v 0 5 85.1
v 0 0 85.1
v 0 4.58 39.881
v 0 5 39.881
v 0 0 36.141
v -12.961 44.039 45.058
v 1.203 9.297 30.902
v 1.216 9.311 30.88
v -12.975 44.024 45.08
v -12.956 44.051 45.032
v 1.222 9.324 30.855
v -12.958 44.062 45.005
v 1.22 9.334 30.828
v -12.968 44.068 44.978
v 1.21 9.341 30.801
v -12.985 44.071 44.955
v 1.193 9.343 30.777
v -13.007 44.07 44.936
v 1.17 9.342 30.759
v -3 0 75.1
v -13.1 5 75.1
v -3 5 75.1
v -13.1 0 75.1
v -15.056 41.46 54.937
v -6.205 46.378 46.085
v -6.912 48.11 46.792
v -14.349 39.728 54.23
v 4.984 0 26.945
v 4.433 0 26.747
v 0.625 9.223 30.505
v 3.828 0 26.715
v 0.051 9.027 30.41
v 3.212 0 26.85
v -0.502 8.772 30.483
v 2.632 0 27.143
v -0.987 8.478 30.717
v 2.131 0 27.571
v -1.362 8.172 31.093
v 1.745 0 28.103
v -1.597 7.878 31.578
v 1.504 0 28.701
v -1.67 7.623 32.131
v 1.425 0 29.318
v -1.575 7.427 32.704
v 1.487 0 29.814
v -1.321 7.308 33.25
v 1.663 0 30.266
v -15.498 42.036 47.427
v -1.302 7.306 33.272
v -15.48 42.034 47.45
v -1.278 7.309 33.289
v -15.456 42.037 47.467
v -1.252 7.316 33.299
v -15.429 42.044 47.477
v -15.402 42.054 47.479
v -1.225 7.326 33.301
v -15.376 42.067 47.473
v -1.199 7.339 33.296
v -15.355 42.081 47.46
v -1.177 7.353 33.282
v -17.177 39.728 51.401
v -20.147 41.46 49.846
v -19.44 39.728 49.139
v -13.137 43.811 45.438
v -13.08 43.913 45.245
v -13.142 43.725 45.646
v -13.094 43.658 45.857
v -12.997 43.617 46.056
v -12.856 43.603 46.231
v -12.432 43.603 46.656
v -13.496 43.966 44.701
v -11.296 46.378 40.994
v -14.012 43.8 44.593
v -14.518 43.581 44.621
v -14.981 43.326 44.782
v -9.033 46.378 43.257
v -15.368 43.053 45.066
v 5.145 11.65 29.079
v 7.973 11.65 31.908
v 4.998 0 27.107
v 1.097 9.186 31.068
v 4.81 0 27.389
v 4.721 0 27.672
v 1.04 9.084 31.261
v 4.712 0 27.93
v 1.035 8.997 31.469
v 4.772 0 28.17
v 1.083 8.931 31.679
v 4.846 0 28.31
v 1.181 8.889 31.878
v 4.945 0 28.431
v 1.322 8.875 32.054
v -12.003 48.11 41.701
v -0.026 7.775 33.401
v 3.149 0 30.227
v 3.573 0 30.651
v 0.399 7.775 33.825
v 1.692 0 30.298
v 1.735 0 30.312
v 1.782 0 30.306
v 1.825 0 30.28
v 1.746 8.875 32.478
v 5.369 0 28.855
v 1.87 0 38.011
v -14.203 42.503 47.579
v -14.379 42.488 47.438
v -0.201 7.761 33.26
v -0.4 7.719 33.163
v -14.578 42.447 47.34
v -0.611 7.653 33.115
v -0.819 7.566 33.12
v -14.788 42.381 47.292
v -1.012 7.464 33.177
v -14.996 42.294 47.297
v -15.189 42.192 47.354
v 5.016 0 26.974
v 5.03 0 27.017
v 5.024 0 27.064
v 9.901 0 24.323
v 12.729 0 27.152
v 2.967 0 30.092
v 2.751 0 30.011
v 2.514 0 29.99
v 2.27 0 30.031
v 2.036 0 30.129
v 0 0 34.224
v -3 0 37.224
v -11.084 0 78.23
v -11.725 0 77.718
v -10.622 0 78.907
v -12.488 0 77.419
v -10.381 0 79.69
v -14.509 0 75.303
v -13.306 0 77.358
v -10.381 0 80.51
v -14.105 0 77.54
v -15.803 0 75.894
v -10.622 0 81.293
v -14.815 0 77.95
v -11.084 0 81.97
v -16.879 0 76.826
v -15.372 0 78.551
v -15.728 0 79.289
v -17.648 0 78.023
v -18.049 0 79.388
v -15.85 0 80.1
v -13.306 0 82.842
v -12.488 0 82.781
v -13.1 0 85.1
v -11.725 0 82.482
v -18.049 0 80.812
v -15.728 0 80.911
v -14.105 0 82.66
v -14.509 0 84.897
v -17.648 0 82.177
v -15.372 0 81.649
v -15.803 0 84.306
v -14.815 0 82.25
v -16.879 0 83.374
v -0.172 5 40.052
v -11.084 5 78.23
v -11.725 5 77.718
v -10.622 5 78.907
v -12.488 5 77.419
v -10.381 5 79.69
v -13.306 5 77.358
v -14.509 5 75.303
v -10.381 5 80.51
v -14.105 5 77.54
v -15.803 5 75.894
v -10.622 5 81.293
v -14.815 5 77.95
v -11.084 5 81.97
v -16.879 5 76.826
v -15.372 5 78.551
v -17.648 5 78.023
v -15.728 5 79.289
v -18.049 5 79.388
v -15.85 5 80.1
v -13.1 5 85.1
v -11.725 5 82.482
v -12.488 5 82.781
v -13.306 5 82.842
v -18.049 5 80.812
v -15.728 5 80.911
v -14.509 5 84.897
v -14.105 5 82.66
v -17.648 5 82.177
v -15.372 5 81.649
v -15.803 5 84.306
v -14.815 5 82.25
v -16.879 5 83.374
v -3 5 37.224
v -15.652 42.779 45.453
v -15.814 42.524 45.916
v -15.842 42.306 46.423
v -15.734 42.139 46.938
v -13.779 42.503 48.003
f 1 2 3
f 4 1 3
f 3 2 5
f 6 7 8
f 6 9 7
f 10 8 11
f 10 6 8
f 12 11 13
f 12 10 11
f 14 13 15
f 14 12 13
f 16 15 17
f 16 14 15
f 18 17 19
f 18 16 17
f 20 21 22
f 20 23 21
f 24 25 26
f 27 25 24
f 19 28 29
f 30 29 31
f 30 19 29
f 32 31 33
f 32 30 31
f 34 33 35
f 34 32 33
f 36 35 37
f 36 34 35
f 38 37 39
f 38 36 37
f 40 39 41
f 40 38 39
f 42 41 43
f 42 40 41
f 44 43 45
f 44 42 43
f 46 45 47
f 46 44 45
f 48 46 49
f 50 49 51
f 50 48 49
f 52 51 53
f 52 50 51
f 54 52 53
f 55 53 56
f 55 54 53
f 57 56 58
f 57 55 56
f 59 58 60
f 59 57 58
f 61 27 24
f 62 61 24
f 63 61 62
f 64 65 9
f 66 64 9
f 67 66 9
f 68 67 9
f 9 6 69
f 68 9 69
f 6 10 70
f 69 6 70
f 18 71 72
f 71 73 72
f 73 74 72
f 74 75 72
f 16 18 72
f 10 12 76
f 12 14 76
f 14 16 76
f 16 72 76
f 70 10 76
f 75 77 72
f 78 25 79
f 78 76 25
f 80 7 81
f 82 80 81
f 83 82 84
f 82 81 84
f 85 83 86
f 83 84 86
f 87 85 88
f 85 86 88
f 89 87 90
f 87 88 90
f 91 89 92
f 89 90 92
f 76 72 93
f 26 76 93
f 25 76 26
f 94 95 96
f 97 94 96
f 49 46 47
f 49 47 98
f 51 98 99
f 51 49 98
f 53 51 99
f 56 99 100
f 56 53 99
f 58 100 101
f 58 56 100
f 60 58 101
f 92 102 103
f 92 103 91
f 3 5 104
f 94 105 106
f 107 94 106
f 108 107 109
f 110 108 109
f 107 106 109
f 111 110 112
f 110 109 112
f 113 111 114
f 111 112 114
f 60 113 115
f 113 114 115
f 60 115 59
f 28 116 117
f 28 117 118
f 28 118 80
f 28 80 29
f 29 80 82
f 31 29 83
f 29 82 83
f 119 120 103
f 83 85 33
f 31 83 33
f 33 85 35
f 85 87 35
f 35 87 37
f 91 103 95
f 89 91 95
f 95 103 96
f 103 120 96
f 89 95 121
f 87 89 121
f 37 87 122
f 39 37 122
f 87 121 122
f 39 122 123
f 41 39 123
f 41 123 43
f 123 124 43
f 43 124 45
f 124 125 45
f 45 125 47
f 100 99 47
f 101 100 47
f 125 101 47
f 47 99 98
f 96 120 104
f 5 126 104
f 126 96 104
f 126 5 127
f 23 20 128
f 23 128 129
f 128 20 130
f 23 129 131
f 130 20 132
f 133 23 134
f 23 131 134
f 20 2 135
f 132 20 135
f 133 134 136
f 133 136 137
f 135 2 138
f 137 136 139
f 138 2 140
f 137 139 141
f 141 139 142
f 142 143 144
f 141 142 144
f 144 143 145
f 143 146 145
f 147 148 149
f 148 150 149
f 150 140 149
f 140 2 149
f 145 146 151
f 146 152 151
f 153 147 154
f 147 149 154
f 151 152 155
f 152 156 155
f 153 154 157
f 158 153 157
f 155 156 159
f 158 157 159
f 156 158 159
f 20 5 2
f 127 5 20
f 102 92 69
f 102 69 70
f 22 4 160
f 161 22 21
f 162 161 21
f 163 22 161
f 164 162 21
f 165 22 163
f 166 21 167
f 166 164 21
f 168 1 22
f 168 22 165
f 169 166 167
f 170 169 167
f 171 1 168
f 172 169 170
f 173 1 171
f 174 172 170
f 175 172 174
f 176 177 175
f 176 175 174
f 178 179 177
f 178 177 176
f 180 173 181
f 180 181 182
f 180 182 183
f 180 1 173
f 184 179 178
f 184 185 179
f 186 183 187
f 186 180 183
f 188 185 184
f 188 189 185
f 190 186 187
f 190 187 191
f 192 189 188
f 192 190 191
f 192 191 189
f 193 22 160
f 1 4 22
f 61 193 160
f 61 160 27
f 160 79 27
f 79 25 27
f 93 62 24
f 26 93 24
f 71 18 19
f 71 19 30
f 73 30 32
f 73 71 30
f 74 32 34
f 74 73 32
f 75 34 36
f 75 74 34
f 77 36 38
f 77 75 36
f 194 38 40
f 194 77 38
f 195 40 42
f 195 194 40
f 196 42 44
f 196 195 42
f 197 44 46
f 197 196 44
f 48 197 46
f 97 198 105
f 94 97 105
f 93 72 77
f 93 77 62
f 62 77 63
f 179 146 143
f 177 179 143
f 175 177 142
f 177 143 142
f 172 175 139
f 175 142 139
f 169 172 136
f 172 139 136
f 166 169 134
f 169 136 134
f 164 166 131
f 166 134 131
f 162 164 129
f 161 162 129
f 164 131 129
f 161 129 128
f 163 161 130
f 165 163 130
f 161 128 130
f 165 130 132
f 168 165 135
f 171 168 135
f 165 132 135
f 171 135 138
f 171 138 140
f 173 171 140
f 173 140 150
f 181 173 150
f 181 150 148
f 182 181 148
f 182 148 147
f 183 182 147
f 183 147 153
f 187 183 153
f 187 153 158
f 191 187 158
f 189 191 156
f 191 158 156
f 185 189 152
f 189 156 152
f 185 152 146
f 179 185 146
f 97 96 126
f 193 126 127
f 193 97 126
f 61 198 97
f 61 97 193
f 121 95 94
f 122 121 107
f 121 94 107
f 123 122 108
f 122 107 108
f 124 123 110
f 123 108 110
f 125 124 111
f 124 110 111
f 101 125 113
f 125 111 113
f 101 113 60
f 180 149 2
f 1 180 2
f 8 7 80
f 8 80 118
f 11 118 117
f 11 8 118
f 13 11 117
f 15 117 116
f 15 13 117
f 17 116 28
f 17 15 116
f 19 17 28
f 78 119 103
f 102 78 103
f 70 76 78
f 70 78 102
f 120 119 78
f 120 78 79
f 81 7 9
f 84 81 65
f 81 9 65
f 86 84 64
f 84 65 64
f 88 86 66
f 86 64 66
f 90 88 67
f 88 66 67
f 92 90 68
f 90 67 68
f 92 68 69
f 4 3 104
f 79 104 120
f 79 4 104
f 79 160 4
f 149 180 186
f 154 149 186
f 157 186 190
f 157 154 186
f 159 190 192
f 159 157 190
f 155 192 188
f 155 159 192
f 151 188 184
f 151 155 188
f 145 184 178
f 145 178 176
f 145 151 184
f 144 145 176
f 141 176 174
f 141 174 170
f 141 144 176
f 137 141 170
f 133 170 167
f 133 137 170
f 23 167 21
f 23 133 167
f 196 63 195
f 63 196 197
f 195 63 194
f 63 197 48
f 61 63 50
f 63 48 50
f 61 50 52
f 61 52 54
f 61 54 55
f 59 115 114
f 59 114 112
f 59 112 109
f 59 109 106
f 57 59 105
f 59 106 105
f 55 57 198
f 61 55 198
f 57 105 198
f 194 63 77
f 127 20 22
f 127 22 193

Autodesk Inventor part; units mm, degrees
ref_plane "YZ Plane" through (0, 0, 0) normal (1, 0, 0) x (0, 1, 0)
ref_plane "XZ Plane" through (0, 0, 0) normal (0, 1, 0) x (-1, 0, 0)
ref_plane "XY Plane" through (0, 0, 0) normal (0, 0, 1) x (1, 0, 0)
sketch "Sketch2" plane through (0, 0, 0) normal (0, 1, 0) x (-1, 0, 0)
  circle A0 centre (13.1, 80.1) radius 2.75
  circle A1 centre (80.1, 13.1) radius 2.75 construction
  line L0 (13.1, 80.1) -> (13.1, 13.1)
  line L1 (13.1, 13.1) -> (80.1, 13.1)
  line L2 (3, 37.224) -> (37.224, 3)
  line L3 (3, 37.224) -> (51.4, 37.224) construction
  circle A2 centre (80.1, 13.1) radius 2.75
  line L4 (3.1, 112.1) -> (3.1, 79.1)
  line L5 (79.1, 3.1) -> (112.1, 3.1)
  circle A3 centre (13.1, 80.1) radius 5
  line L6 (13.1, 75.1) -> (3, 75.1)
  line L7 (3, 75.1) -> (3, 3)
  line L8 (13.1, 85.1) -> (0, 85.1)
  line L9 (0, 85.1) -> (0, 0)
  circle A4 centre (80.1, 13.1) radius 5
  line L10 (85.1, 13.1) -> (85.1, 0)
  line L11 (75.1, 13.1) -> (75.1, 3)
  line L12 (75.1, 3) -> (3, 3)
  line L13 (85.1, 0) -> (0, 0)
  line L14 (3, 37.224) -> (-4.0711, 30.1529)
  line L15 (3, 37.224) -> (13, 37.224) construction
  point P0 (0, 0)
  point P1 (0, 34.224)
  dimension "d11" = 48.4
  dimension "d12" = 45
  dimension "d13" = 10
  dimension "d14" = 10.1
  dimension "d15" = 13.1
  dimension "d16" = 3
  dimension "d17" = 10
  dimension "d18" = 13.1
  dimension "d19" = 10.1
  dimension "d20" = 10
  dimension "d21" = 135
extrude "Extrusion2" add sketch "Sketch2" along normal blind 5 contours L6 L7 L14 L9 L8 A3 | A3
sketch "Sketch4" plane through (-3, 0, 37.224) normal (-0.7071068, 0, -0.7071068) x (-0.7071068, 0, 0.7071068)
  line L0 (0, 0) -> (0, 5) projected
  line L1 (0, 5) -> (20.05, 39.7276)
  line L2 (0, 5) -> (40.1, 5) construction
  line L3 (8.5319, 46.3776) -> (-11.5181, 11.65)
  line L4 (-11.5181, 11.65) -> (0, 5)
  line L5 (8.5319, 46.3776) -> (20.05, 39.7276)
  line L6 (-4.2426, 0) -> (0, 0) projected
  line L7 (0, 0) -> (0, 5) projected
  line L8 (-4.2426, 5) -> (0, 5) projected
  line L9 (-4.2426, 0) -> (-4.2426, 5) projected
  line L10 (-4.2426, 5) -> (-4.2426, 7.4495)
  point P0 (-28.4426, 0)
  dimension "d33" = 300
  dimension "d34" = 40.1
  dimension "d35" = 13.3
extrude "Extrusion3" add sketch "Sketch4" against normal blind 4 contours L4 L3 L5 L1
sketch "Sketch6" plane through (0, -2.3485, 34.224) normal (-0.7071068, 0, -0.7071068) x (-0.7071068, 0, 0.7071068)
  line L0 (0, 2.3485) -> (0, 7.3485) projected
  circle A0 centre (0.9836, 15.0036) radius 2.6
  line L1 (3.7898, 7.6099) -> (-7.6418, 14.2099)
  circle A1 centre (6.9836, 25.3959) radius 2.6
  line L2 (0, 2.3485) -> (4.2426, 2.3485) projected
  line L3 (-7.2755, 13.9985) -> (4.2426, 7.3485) projected
  line L4 (11.0336, 32.4107) -> (-8.7344, -1.8285)
  line L5 (4.2426, 2.3485) -> (4.2426, 7.3485) projected
  line L6 (0, 7.3485) -> (4.2426, 7.3485) projected
  point P0 (-24.2, 2.3485)
  dimension "d38" = 5.2
  dimension "d39" = 5
  dimension "d40" = 12
extrude "Extrusion5" [suppressed]
fillet "Fillet1" [suppressed]
sketch "Sketch9" plane through (-0.1716, 0, 40.0524) normal (0.7071068, 0, 0.7071068) x (0.7071068, 0, -0.7071068)
  line L0 (0, 5) -> (-20.05, 39.7276) projected
  line L1 (-20.05, 39.7276) -> (-12.55, 26.7372)
  line L2 (-12.55, 26.7372) -> (-15.1481, 25.2372)
  line L3 (-15.1481, 25.2372) -> (-22.6481, 38.2276)
  line L4 (-22.6481, 38.2276) -> (-20.05, 39.7276)
  line L5 (-8.5319, 46.3776) -> (-20.05, 39.7276) projected
  line L6 (-14.2909, 43.0526) -> (11.2, -1.0989)
  line L7 (-8.5319, 46.3776) -> (-1.0319, 33.3872)
  line L8 (1.5662, 34.8872) -> (-5.9338, 47.8776)
  line L9 (-1.0319, 33.3872) -> (1.5662, 34.8872)
  line L10 (-5.9338, 47.8776) -> (-8.5319, 46.3776)
  point P0 (28.4426, 0)
  point P1 (4.6202, -0.5061)
  point P2 (4.1955, 0)
  dimension "d46" = 15
  dimension "d47" = 3
extrude "Extrusion6" [suppressed]
sketch "Sketch10" plane through (-17.1775, 39.7276, 51.4015) normal (-0.3535534, 0.8660254, 0.3535534) x (0.7071068, 0, 0.7071068)
  line L0 (0, 0) -> (0, 13.3) projected
  line L1 (0, 0) -> (4, 0) projected
  line L2 (4, 13.3) -> (4, 0) projected
  line L3 (0, 13.3) -> (4, 13.3) projected
  line L4 (-0.6, 8.15) -> (0, 8.15)
  line L5 (0, -1.85) -> (0, 5.15)
  line L6 (0, 5.15) -> (-0.6, 5.15)
  arc A0 (-0.6, 5.15) -> (-1.099, 4.6815) centre (-0.6, 4.65) ccw
  arc A1 (-1.7225, 4.2287) -> (-1.099, 4.6815) centre (-1.598, 4.713) ccw
  arc A2 (-1.7225, 9.0713) -> (-1.7225, 4.2287) centre (-1.1, 6.65) ccw
  arc A3 (-1.099, 8.6185) -> (-1.7225, 9.0713) centre (-1.598, 8.587) ccw
  arc A4 (-1.099, 8.6185) -> (-0.6, 8.15) centre (-0.6, 8.65) ccw
  line L7 (0, 0) -> (0, 13.3) projected
  line L8 (0.6, 5.35) -> (-0.6, 5.35)
  arc A5 (-0.6, 5.35) -> (-1.2986, 4.6941) centre (-0.6, 4.65) ccw
  arc A6 (-1.6727, 4.4224) -> (-1.2986, 4.6941) centre (-1.598, 4.713) ccw
  arc A7 (-1.6727, 8.8776) -> (-1.6727, 4.4224) centre (-1.1, 6.65) ccw
  arc A8 (-1.2986, 8.6059) -> (-1.6727, 8.8776) centre (-1.598, 8.587) ccw
  arc A9 (-1.2986, 8.6059) -> (-0.6, 7.95) centre (-0.6, 8.65) ccw
  line L9 (-0.6, 7.95) -> (0.6, 7.95)
  line L10 (0.3, -1.85) -> (0.3, 5.45)
  line L11 (0.3, 5.45) -> (-0.6, 5.45)
  arc A10 (-0.6, 5.45) -> (-1.3984, 4.7004) centre (-0.6, 4.65) ccw
  arc A11 (-1.6478, 4.5193) -> (-1.3984, 4.7004) centre (-1.598, 4.713) ccw
  arc A12 (-1.6478, 8.7807) -> (-1.6478, 4.5193) centre (-1.1, 6.65) ccw
  arc A13 (-1.3984, 8.5996) -> (-1.6478, 8.7807) centre (-1.598, 8.587) ccw
  arc A14 (-1.3984, 8.5996) -> (-0.6, 7.85) centre (-0.6, 8.65) ccw
  line L12 (-0.6, 7.85) -> (0.4, 7.85)
  line L13 (0.4, -1.85) -> (0.4, 5.55)
  line L14 (0.4, 5.55) -> (-0.6, 5.55)
  arc A15 (-0.6, 5.55) -> (-1.4982, 4.7067) centre (-0.6, 4.65) ccw
  arc A16 (-1.6229, 4.6161) -> (-1.4982, 4.7067) centre (-1.598, 4.713) ccw
  arc A17 (-1.6229, 8.6839) -> (-1.6229, 4.6161) centre (-1.1, 6.65) ccw
  arc A18 (-1.4982, 8.5933) -> (-1.6229, 8.6839) centre (-1.598, 8.587) ccw
  arc A19 (-1.4982, 8.5933) -> (-0.6, 7.75) centre (-0.6, 8.65) ccw
  line L15 (-0.6, 7.75) -> (0.4, 7.75)
  point P0 (-24.2, 22.132)
  point P1 (-11.4165, -11.1867)
  point P2 (0, 6.65)
  point P3 (0, 6.65)
  point P4 (0, 5.35)
  point P5 (0, 7.95)
  point P6 (0, 5.45)
  point P7 (0, 7.85)
  point P8 (0, 5.55)
  point P9 (0, 7.75)
  dimension "d64" = 2.5
  dimension "d65" = 0.6
  dimension "d66" = 1.1
  dimension "d67" = 0.2
  dimension "d68" = 0.3
  dimension "d69" = 0.4
extrude "Extrusion7" add sketch "Sketch10" against normal up to surface (40.1 mm away) contours L14 A15 A16 A17 A18 A19 L15 L0
sketch "Sketch11" plane through (-14.3491, 39.7276, 54.2299) normal (-0.3535534, 0.8660254, 0.3535534) x (0.7071068, 0, 0.7071068)
  line L0 (-4, 7.75) -> (-4, 13.3) projected
  line L1 (-4, 0) -> (0, 0) projected
  line L2 (0, 13.3) -> (0, 0) projected
  line L3 (-4, 13.3) -> (0, 13.3) projected
  line L4 (0, 0) -> (0, 13.3)
  line L5 (0, 0) -> (-7.3, 0)
  line L6 (-7.7, 13.3) -> (0, 13.3)
  line L7 (0, 13.3) -> (0, 0)
  line L8 (-4, 0) -> (-4, 5.55) projected
  line L9 (-4, 7.75) -> (-4.6, 7.75) projected
  arc A0 (-5.4982, 8.5933) -> (-4.6, 7.75) centre (-4.6, 8.65) ccw projected
  arc A1 (-5.4982, 8.5933) -> (-5.6229, 8.6839) centre (-5.598, 8.587) ccw projected
  arc A2 (-5.6229, 8.6839) -> (-5.6229, 4.6161) centre (-5.1, 6.65) ccw projected
  arc A3 (-5.6229, 4.6161) -> (-5.4982, 4.7067) centre (-5.598, 4.713) ccw projected
  arc A4 (-4.6, 5.55) -> (-5.4982, 4.7067) centre (-4.6, 4.65) ccw projected
  line L10 (-4.6, 5.55) -> (-4, 5.55) projected
  line L11 (-7.2, 13.3) -> (-7.2, 0)
  arc A5 (-5.6229, 8.6839) -> (-5.6229, 4.6161) centre (-5.1, 6.65) ccw projected
  point P0 (-28.2, 22.132)
  point P1 (-4, 0)
  point P2 (0, 13.3)
  point P3 (0, 0)
  point P4 (-4, 13.3)
  point P5 (0, 0)
  point P6 (-4, 13.3)
  point P7 (-4, 0)
  point P8 (-7.2, 6.65)
  point P9 (-7.2, 6.65)
  point P10 (-4, 0)
extrude "Extrusion8" add sketch "Sketch11" along normal blind 2
sketch "Sketch12" plane through (7.973, 11.65, 31.9078) normal (0.3535534, -0.8660254, -0.3535534) x (0.7071068, 0, 0.7071068)
  line L0 (31.9748, 40.7808) -> (-4, 9.6258) projected
  line L1 (-4, 0) -> (-4, 5.55) projected
  line L2 (-4, 0) -> (0, 0) projected
  line L3 (0, 13.3) -> (0, 0) projected
  line L4 (-4, 13.3) -> (0, 13.3) projected
  line L5 (-4, 7.75) -> (-4, 13.3) projected
  line L6 (-4.6, 7.75) -> (-4, 7.75) projected
  arc A0 (-5.4982, 8.5933) -> (-4.6, 7.75) centre (-4.6, 8.65) ccw projected
  arc A1 (-5.4982, 8.5933) -> (-5.6229, 8.6839) centre (-5.598, 8.587) ccw projected
  arc A2 (-5.6229, 8.6839) -> (-5.6229, 4.6161) centre (-5.1, 6.65) ccw projected
  arc A3 (-5.6229, 4.6161) -> (-5.4982, 4.7067) centre (-5.598, 4.713) ccw projected
  arc A4 (-4.6, 5.55) -> (-5.4982, 4.7067) centre (-4.6, 4.65) ccw projected
  line L7 (-4, 5.55) -> (-4.6, 5.55) projected
  point P0 (-28.2, -8.832)
extrude "Extrusion9" add sketch "Sketch12" along normal up to surface surface through (-9.05, 0, 59.662) normal (0, 1, 0)
properties part number "Pixy2 mount"
